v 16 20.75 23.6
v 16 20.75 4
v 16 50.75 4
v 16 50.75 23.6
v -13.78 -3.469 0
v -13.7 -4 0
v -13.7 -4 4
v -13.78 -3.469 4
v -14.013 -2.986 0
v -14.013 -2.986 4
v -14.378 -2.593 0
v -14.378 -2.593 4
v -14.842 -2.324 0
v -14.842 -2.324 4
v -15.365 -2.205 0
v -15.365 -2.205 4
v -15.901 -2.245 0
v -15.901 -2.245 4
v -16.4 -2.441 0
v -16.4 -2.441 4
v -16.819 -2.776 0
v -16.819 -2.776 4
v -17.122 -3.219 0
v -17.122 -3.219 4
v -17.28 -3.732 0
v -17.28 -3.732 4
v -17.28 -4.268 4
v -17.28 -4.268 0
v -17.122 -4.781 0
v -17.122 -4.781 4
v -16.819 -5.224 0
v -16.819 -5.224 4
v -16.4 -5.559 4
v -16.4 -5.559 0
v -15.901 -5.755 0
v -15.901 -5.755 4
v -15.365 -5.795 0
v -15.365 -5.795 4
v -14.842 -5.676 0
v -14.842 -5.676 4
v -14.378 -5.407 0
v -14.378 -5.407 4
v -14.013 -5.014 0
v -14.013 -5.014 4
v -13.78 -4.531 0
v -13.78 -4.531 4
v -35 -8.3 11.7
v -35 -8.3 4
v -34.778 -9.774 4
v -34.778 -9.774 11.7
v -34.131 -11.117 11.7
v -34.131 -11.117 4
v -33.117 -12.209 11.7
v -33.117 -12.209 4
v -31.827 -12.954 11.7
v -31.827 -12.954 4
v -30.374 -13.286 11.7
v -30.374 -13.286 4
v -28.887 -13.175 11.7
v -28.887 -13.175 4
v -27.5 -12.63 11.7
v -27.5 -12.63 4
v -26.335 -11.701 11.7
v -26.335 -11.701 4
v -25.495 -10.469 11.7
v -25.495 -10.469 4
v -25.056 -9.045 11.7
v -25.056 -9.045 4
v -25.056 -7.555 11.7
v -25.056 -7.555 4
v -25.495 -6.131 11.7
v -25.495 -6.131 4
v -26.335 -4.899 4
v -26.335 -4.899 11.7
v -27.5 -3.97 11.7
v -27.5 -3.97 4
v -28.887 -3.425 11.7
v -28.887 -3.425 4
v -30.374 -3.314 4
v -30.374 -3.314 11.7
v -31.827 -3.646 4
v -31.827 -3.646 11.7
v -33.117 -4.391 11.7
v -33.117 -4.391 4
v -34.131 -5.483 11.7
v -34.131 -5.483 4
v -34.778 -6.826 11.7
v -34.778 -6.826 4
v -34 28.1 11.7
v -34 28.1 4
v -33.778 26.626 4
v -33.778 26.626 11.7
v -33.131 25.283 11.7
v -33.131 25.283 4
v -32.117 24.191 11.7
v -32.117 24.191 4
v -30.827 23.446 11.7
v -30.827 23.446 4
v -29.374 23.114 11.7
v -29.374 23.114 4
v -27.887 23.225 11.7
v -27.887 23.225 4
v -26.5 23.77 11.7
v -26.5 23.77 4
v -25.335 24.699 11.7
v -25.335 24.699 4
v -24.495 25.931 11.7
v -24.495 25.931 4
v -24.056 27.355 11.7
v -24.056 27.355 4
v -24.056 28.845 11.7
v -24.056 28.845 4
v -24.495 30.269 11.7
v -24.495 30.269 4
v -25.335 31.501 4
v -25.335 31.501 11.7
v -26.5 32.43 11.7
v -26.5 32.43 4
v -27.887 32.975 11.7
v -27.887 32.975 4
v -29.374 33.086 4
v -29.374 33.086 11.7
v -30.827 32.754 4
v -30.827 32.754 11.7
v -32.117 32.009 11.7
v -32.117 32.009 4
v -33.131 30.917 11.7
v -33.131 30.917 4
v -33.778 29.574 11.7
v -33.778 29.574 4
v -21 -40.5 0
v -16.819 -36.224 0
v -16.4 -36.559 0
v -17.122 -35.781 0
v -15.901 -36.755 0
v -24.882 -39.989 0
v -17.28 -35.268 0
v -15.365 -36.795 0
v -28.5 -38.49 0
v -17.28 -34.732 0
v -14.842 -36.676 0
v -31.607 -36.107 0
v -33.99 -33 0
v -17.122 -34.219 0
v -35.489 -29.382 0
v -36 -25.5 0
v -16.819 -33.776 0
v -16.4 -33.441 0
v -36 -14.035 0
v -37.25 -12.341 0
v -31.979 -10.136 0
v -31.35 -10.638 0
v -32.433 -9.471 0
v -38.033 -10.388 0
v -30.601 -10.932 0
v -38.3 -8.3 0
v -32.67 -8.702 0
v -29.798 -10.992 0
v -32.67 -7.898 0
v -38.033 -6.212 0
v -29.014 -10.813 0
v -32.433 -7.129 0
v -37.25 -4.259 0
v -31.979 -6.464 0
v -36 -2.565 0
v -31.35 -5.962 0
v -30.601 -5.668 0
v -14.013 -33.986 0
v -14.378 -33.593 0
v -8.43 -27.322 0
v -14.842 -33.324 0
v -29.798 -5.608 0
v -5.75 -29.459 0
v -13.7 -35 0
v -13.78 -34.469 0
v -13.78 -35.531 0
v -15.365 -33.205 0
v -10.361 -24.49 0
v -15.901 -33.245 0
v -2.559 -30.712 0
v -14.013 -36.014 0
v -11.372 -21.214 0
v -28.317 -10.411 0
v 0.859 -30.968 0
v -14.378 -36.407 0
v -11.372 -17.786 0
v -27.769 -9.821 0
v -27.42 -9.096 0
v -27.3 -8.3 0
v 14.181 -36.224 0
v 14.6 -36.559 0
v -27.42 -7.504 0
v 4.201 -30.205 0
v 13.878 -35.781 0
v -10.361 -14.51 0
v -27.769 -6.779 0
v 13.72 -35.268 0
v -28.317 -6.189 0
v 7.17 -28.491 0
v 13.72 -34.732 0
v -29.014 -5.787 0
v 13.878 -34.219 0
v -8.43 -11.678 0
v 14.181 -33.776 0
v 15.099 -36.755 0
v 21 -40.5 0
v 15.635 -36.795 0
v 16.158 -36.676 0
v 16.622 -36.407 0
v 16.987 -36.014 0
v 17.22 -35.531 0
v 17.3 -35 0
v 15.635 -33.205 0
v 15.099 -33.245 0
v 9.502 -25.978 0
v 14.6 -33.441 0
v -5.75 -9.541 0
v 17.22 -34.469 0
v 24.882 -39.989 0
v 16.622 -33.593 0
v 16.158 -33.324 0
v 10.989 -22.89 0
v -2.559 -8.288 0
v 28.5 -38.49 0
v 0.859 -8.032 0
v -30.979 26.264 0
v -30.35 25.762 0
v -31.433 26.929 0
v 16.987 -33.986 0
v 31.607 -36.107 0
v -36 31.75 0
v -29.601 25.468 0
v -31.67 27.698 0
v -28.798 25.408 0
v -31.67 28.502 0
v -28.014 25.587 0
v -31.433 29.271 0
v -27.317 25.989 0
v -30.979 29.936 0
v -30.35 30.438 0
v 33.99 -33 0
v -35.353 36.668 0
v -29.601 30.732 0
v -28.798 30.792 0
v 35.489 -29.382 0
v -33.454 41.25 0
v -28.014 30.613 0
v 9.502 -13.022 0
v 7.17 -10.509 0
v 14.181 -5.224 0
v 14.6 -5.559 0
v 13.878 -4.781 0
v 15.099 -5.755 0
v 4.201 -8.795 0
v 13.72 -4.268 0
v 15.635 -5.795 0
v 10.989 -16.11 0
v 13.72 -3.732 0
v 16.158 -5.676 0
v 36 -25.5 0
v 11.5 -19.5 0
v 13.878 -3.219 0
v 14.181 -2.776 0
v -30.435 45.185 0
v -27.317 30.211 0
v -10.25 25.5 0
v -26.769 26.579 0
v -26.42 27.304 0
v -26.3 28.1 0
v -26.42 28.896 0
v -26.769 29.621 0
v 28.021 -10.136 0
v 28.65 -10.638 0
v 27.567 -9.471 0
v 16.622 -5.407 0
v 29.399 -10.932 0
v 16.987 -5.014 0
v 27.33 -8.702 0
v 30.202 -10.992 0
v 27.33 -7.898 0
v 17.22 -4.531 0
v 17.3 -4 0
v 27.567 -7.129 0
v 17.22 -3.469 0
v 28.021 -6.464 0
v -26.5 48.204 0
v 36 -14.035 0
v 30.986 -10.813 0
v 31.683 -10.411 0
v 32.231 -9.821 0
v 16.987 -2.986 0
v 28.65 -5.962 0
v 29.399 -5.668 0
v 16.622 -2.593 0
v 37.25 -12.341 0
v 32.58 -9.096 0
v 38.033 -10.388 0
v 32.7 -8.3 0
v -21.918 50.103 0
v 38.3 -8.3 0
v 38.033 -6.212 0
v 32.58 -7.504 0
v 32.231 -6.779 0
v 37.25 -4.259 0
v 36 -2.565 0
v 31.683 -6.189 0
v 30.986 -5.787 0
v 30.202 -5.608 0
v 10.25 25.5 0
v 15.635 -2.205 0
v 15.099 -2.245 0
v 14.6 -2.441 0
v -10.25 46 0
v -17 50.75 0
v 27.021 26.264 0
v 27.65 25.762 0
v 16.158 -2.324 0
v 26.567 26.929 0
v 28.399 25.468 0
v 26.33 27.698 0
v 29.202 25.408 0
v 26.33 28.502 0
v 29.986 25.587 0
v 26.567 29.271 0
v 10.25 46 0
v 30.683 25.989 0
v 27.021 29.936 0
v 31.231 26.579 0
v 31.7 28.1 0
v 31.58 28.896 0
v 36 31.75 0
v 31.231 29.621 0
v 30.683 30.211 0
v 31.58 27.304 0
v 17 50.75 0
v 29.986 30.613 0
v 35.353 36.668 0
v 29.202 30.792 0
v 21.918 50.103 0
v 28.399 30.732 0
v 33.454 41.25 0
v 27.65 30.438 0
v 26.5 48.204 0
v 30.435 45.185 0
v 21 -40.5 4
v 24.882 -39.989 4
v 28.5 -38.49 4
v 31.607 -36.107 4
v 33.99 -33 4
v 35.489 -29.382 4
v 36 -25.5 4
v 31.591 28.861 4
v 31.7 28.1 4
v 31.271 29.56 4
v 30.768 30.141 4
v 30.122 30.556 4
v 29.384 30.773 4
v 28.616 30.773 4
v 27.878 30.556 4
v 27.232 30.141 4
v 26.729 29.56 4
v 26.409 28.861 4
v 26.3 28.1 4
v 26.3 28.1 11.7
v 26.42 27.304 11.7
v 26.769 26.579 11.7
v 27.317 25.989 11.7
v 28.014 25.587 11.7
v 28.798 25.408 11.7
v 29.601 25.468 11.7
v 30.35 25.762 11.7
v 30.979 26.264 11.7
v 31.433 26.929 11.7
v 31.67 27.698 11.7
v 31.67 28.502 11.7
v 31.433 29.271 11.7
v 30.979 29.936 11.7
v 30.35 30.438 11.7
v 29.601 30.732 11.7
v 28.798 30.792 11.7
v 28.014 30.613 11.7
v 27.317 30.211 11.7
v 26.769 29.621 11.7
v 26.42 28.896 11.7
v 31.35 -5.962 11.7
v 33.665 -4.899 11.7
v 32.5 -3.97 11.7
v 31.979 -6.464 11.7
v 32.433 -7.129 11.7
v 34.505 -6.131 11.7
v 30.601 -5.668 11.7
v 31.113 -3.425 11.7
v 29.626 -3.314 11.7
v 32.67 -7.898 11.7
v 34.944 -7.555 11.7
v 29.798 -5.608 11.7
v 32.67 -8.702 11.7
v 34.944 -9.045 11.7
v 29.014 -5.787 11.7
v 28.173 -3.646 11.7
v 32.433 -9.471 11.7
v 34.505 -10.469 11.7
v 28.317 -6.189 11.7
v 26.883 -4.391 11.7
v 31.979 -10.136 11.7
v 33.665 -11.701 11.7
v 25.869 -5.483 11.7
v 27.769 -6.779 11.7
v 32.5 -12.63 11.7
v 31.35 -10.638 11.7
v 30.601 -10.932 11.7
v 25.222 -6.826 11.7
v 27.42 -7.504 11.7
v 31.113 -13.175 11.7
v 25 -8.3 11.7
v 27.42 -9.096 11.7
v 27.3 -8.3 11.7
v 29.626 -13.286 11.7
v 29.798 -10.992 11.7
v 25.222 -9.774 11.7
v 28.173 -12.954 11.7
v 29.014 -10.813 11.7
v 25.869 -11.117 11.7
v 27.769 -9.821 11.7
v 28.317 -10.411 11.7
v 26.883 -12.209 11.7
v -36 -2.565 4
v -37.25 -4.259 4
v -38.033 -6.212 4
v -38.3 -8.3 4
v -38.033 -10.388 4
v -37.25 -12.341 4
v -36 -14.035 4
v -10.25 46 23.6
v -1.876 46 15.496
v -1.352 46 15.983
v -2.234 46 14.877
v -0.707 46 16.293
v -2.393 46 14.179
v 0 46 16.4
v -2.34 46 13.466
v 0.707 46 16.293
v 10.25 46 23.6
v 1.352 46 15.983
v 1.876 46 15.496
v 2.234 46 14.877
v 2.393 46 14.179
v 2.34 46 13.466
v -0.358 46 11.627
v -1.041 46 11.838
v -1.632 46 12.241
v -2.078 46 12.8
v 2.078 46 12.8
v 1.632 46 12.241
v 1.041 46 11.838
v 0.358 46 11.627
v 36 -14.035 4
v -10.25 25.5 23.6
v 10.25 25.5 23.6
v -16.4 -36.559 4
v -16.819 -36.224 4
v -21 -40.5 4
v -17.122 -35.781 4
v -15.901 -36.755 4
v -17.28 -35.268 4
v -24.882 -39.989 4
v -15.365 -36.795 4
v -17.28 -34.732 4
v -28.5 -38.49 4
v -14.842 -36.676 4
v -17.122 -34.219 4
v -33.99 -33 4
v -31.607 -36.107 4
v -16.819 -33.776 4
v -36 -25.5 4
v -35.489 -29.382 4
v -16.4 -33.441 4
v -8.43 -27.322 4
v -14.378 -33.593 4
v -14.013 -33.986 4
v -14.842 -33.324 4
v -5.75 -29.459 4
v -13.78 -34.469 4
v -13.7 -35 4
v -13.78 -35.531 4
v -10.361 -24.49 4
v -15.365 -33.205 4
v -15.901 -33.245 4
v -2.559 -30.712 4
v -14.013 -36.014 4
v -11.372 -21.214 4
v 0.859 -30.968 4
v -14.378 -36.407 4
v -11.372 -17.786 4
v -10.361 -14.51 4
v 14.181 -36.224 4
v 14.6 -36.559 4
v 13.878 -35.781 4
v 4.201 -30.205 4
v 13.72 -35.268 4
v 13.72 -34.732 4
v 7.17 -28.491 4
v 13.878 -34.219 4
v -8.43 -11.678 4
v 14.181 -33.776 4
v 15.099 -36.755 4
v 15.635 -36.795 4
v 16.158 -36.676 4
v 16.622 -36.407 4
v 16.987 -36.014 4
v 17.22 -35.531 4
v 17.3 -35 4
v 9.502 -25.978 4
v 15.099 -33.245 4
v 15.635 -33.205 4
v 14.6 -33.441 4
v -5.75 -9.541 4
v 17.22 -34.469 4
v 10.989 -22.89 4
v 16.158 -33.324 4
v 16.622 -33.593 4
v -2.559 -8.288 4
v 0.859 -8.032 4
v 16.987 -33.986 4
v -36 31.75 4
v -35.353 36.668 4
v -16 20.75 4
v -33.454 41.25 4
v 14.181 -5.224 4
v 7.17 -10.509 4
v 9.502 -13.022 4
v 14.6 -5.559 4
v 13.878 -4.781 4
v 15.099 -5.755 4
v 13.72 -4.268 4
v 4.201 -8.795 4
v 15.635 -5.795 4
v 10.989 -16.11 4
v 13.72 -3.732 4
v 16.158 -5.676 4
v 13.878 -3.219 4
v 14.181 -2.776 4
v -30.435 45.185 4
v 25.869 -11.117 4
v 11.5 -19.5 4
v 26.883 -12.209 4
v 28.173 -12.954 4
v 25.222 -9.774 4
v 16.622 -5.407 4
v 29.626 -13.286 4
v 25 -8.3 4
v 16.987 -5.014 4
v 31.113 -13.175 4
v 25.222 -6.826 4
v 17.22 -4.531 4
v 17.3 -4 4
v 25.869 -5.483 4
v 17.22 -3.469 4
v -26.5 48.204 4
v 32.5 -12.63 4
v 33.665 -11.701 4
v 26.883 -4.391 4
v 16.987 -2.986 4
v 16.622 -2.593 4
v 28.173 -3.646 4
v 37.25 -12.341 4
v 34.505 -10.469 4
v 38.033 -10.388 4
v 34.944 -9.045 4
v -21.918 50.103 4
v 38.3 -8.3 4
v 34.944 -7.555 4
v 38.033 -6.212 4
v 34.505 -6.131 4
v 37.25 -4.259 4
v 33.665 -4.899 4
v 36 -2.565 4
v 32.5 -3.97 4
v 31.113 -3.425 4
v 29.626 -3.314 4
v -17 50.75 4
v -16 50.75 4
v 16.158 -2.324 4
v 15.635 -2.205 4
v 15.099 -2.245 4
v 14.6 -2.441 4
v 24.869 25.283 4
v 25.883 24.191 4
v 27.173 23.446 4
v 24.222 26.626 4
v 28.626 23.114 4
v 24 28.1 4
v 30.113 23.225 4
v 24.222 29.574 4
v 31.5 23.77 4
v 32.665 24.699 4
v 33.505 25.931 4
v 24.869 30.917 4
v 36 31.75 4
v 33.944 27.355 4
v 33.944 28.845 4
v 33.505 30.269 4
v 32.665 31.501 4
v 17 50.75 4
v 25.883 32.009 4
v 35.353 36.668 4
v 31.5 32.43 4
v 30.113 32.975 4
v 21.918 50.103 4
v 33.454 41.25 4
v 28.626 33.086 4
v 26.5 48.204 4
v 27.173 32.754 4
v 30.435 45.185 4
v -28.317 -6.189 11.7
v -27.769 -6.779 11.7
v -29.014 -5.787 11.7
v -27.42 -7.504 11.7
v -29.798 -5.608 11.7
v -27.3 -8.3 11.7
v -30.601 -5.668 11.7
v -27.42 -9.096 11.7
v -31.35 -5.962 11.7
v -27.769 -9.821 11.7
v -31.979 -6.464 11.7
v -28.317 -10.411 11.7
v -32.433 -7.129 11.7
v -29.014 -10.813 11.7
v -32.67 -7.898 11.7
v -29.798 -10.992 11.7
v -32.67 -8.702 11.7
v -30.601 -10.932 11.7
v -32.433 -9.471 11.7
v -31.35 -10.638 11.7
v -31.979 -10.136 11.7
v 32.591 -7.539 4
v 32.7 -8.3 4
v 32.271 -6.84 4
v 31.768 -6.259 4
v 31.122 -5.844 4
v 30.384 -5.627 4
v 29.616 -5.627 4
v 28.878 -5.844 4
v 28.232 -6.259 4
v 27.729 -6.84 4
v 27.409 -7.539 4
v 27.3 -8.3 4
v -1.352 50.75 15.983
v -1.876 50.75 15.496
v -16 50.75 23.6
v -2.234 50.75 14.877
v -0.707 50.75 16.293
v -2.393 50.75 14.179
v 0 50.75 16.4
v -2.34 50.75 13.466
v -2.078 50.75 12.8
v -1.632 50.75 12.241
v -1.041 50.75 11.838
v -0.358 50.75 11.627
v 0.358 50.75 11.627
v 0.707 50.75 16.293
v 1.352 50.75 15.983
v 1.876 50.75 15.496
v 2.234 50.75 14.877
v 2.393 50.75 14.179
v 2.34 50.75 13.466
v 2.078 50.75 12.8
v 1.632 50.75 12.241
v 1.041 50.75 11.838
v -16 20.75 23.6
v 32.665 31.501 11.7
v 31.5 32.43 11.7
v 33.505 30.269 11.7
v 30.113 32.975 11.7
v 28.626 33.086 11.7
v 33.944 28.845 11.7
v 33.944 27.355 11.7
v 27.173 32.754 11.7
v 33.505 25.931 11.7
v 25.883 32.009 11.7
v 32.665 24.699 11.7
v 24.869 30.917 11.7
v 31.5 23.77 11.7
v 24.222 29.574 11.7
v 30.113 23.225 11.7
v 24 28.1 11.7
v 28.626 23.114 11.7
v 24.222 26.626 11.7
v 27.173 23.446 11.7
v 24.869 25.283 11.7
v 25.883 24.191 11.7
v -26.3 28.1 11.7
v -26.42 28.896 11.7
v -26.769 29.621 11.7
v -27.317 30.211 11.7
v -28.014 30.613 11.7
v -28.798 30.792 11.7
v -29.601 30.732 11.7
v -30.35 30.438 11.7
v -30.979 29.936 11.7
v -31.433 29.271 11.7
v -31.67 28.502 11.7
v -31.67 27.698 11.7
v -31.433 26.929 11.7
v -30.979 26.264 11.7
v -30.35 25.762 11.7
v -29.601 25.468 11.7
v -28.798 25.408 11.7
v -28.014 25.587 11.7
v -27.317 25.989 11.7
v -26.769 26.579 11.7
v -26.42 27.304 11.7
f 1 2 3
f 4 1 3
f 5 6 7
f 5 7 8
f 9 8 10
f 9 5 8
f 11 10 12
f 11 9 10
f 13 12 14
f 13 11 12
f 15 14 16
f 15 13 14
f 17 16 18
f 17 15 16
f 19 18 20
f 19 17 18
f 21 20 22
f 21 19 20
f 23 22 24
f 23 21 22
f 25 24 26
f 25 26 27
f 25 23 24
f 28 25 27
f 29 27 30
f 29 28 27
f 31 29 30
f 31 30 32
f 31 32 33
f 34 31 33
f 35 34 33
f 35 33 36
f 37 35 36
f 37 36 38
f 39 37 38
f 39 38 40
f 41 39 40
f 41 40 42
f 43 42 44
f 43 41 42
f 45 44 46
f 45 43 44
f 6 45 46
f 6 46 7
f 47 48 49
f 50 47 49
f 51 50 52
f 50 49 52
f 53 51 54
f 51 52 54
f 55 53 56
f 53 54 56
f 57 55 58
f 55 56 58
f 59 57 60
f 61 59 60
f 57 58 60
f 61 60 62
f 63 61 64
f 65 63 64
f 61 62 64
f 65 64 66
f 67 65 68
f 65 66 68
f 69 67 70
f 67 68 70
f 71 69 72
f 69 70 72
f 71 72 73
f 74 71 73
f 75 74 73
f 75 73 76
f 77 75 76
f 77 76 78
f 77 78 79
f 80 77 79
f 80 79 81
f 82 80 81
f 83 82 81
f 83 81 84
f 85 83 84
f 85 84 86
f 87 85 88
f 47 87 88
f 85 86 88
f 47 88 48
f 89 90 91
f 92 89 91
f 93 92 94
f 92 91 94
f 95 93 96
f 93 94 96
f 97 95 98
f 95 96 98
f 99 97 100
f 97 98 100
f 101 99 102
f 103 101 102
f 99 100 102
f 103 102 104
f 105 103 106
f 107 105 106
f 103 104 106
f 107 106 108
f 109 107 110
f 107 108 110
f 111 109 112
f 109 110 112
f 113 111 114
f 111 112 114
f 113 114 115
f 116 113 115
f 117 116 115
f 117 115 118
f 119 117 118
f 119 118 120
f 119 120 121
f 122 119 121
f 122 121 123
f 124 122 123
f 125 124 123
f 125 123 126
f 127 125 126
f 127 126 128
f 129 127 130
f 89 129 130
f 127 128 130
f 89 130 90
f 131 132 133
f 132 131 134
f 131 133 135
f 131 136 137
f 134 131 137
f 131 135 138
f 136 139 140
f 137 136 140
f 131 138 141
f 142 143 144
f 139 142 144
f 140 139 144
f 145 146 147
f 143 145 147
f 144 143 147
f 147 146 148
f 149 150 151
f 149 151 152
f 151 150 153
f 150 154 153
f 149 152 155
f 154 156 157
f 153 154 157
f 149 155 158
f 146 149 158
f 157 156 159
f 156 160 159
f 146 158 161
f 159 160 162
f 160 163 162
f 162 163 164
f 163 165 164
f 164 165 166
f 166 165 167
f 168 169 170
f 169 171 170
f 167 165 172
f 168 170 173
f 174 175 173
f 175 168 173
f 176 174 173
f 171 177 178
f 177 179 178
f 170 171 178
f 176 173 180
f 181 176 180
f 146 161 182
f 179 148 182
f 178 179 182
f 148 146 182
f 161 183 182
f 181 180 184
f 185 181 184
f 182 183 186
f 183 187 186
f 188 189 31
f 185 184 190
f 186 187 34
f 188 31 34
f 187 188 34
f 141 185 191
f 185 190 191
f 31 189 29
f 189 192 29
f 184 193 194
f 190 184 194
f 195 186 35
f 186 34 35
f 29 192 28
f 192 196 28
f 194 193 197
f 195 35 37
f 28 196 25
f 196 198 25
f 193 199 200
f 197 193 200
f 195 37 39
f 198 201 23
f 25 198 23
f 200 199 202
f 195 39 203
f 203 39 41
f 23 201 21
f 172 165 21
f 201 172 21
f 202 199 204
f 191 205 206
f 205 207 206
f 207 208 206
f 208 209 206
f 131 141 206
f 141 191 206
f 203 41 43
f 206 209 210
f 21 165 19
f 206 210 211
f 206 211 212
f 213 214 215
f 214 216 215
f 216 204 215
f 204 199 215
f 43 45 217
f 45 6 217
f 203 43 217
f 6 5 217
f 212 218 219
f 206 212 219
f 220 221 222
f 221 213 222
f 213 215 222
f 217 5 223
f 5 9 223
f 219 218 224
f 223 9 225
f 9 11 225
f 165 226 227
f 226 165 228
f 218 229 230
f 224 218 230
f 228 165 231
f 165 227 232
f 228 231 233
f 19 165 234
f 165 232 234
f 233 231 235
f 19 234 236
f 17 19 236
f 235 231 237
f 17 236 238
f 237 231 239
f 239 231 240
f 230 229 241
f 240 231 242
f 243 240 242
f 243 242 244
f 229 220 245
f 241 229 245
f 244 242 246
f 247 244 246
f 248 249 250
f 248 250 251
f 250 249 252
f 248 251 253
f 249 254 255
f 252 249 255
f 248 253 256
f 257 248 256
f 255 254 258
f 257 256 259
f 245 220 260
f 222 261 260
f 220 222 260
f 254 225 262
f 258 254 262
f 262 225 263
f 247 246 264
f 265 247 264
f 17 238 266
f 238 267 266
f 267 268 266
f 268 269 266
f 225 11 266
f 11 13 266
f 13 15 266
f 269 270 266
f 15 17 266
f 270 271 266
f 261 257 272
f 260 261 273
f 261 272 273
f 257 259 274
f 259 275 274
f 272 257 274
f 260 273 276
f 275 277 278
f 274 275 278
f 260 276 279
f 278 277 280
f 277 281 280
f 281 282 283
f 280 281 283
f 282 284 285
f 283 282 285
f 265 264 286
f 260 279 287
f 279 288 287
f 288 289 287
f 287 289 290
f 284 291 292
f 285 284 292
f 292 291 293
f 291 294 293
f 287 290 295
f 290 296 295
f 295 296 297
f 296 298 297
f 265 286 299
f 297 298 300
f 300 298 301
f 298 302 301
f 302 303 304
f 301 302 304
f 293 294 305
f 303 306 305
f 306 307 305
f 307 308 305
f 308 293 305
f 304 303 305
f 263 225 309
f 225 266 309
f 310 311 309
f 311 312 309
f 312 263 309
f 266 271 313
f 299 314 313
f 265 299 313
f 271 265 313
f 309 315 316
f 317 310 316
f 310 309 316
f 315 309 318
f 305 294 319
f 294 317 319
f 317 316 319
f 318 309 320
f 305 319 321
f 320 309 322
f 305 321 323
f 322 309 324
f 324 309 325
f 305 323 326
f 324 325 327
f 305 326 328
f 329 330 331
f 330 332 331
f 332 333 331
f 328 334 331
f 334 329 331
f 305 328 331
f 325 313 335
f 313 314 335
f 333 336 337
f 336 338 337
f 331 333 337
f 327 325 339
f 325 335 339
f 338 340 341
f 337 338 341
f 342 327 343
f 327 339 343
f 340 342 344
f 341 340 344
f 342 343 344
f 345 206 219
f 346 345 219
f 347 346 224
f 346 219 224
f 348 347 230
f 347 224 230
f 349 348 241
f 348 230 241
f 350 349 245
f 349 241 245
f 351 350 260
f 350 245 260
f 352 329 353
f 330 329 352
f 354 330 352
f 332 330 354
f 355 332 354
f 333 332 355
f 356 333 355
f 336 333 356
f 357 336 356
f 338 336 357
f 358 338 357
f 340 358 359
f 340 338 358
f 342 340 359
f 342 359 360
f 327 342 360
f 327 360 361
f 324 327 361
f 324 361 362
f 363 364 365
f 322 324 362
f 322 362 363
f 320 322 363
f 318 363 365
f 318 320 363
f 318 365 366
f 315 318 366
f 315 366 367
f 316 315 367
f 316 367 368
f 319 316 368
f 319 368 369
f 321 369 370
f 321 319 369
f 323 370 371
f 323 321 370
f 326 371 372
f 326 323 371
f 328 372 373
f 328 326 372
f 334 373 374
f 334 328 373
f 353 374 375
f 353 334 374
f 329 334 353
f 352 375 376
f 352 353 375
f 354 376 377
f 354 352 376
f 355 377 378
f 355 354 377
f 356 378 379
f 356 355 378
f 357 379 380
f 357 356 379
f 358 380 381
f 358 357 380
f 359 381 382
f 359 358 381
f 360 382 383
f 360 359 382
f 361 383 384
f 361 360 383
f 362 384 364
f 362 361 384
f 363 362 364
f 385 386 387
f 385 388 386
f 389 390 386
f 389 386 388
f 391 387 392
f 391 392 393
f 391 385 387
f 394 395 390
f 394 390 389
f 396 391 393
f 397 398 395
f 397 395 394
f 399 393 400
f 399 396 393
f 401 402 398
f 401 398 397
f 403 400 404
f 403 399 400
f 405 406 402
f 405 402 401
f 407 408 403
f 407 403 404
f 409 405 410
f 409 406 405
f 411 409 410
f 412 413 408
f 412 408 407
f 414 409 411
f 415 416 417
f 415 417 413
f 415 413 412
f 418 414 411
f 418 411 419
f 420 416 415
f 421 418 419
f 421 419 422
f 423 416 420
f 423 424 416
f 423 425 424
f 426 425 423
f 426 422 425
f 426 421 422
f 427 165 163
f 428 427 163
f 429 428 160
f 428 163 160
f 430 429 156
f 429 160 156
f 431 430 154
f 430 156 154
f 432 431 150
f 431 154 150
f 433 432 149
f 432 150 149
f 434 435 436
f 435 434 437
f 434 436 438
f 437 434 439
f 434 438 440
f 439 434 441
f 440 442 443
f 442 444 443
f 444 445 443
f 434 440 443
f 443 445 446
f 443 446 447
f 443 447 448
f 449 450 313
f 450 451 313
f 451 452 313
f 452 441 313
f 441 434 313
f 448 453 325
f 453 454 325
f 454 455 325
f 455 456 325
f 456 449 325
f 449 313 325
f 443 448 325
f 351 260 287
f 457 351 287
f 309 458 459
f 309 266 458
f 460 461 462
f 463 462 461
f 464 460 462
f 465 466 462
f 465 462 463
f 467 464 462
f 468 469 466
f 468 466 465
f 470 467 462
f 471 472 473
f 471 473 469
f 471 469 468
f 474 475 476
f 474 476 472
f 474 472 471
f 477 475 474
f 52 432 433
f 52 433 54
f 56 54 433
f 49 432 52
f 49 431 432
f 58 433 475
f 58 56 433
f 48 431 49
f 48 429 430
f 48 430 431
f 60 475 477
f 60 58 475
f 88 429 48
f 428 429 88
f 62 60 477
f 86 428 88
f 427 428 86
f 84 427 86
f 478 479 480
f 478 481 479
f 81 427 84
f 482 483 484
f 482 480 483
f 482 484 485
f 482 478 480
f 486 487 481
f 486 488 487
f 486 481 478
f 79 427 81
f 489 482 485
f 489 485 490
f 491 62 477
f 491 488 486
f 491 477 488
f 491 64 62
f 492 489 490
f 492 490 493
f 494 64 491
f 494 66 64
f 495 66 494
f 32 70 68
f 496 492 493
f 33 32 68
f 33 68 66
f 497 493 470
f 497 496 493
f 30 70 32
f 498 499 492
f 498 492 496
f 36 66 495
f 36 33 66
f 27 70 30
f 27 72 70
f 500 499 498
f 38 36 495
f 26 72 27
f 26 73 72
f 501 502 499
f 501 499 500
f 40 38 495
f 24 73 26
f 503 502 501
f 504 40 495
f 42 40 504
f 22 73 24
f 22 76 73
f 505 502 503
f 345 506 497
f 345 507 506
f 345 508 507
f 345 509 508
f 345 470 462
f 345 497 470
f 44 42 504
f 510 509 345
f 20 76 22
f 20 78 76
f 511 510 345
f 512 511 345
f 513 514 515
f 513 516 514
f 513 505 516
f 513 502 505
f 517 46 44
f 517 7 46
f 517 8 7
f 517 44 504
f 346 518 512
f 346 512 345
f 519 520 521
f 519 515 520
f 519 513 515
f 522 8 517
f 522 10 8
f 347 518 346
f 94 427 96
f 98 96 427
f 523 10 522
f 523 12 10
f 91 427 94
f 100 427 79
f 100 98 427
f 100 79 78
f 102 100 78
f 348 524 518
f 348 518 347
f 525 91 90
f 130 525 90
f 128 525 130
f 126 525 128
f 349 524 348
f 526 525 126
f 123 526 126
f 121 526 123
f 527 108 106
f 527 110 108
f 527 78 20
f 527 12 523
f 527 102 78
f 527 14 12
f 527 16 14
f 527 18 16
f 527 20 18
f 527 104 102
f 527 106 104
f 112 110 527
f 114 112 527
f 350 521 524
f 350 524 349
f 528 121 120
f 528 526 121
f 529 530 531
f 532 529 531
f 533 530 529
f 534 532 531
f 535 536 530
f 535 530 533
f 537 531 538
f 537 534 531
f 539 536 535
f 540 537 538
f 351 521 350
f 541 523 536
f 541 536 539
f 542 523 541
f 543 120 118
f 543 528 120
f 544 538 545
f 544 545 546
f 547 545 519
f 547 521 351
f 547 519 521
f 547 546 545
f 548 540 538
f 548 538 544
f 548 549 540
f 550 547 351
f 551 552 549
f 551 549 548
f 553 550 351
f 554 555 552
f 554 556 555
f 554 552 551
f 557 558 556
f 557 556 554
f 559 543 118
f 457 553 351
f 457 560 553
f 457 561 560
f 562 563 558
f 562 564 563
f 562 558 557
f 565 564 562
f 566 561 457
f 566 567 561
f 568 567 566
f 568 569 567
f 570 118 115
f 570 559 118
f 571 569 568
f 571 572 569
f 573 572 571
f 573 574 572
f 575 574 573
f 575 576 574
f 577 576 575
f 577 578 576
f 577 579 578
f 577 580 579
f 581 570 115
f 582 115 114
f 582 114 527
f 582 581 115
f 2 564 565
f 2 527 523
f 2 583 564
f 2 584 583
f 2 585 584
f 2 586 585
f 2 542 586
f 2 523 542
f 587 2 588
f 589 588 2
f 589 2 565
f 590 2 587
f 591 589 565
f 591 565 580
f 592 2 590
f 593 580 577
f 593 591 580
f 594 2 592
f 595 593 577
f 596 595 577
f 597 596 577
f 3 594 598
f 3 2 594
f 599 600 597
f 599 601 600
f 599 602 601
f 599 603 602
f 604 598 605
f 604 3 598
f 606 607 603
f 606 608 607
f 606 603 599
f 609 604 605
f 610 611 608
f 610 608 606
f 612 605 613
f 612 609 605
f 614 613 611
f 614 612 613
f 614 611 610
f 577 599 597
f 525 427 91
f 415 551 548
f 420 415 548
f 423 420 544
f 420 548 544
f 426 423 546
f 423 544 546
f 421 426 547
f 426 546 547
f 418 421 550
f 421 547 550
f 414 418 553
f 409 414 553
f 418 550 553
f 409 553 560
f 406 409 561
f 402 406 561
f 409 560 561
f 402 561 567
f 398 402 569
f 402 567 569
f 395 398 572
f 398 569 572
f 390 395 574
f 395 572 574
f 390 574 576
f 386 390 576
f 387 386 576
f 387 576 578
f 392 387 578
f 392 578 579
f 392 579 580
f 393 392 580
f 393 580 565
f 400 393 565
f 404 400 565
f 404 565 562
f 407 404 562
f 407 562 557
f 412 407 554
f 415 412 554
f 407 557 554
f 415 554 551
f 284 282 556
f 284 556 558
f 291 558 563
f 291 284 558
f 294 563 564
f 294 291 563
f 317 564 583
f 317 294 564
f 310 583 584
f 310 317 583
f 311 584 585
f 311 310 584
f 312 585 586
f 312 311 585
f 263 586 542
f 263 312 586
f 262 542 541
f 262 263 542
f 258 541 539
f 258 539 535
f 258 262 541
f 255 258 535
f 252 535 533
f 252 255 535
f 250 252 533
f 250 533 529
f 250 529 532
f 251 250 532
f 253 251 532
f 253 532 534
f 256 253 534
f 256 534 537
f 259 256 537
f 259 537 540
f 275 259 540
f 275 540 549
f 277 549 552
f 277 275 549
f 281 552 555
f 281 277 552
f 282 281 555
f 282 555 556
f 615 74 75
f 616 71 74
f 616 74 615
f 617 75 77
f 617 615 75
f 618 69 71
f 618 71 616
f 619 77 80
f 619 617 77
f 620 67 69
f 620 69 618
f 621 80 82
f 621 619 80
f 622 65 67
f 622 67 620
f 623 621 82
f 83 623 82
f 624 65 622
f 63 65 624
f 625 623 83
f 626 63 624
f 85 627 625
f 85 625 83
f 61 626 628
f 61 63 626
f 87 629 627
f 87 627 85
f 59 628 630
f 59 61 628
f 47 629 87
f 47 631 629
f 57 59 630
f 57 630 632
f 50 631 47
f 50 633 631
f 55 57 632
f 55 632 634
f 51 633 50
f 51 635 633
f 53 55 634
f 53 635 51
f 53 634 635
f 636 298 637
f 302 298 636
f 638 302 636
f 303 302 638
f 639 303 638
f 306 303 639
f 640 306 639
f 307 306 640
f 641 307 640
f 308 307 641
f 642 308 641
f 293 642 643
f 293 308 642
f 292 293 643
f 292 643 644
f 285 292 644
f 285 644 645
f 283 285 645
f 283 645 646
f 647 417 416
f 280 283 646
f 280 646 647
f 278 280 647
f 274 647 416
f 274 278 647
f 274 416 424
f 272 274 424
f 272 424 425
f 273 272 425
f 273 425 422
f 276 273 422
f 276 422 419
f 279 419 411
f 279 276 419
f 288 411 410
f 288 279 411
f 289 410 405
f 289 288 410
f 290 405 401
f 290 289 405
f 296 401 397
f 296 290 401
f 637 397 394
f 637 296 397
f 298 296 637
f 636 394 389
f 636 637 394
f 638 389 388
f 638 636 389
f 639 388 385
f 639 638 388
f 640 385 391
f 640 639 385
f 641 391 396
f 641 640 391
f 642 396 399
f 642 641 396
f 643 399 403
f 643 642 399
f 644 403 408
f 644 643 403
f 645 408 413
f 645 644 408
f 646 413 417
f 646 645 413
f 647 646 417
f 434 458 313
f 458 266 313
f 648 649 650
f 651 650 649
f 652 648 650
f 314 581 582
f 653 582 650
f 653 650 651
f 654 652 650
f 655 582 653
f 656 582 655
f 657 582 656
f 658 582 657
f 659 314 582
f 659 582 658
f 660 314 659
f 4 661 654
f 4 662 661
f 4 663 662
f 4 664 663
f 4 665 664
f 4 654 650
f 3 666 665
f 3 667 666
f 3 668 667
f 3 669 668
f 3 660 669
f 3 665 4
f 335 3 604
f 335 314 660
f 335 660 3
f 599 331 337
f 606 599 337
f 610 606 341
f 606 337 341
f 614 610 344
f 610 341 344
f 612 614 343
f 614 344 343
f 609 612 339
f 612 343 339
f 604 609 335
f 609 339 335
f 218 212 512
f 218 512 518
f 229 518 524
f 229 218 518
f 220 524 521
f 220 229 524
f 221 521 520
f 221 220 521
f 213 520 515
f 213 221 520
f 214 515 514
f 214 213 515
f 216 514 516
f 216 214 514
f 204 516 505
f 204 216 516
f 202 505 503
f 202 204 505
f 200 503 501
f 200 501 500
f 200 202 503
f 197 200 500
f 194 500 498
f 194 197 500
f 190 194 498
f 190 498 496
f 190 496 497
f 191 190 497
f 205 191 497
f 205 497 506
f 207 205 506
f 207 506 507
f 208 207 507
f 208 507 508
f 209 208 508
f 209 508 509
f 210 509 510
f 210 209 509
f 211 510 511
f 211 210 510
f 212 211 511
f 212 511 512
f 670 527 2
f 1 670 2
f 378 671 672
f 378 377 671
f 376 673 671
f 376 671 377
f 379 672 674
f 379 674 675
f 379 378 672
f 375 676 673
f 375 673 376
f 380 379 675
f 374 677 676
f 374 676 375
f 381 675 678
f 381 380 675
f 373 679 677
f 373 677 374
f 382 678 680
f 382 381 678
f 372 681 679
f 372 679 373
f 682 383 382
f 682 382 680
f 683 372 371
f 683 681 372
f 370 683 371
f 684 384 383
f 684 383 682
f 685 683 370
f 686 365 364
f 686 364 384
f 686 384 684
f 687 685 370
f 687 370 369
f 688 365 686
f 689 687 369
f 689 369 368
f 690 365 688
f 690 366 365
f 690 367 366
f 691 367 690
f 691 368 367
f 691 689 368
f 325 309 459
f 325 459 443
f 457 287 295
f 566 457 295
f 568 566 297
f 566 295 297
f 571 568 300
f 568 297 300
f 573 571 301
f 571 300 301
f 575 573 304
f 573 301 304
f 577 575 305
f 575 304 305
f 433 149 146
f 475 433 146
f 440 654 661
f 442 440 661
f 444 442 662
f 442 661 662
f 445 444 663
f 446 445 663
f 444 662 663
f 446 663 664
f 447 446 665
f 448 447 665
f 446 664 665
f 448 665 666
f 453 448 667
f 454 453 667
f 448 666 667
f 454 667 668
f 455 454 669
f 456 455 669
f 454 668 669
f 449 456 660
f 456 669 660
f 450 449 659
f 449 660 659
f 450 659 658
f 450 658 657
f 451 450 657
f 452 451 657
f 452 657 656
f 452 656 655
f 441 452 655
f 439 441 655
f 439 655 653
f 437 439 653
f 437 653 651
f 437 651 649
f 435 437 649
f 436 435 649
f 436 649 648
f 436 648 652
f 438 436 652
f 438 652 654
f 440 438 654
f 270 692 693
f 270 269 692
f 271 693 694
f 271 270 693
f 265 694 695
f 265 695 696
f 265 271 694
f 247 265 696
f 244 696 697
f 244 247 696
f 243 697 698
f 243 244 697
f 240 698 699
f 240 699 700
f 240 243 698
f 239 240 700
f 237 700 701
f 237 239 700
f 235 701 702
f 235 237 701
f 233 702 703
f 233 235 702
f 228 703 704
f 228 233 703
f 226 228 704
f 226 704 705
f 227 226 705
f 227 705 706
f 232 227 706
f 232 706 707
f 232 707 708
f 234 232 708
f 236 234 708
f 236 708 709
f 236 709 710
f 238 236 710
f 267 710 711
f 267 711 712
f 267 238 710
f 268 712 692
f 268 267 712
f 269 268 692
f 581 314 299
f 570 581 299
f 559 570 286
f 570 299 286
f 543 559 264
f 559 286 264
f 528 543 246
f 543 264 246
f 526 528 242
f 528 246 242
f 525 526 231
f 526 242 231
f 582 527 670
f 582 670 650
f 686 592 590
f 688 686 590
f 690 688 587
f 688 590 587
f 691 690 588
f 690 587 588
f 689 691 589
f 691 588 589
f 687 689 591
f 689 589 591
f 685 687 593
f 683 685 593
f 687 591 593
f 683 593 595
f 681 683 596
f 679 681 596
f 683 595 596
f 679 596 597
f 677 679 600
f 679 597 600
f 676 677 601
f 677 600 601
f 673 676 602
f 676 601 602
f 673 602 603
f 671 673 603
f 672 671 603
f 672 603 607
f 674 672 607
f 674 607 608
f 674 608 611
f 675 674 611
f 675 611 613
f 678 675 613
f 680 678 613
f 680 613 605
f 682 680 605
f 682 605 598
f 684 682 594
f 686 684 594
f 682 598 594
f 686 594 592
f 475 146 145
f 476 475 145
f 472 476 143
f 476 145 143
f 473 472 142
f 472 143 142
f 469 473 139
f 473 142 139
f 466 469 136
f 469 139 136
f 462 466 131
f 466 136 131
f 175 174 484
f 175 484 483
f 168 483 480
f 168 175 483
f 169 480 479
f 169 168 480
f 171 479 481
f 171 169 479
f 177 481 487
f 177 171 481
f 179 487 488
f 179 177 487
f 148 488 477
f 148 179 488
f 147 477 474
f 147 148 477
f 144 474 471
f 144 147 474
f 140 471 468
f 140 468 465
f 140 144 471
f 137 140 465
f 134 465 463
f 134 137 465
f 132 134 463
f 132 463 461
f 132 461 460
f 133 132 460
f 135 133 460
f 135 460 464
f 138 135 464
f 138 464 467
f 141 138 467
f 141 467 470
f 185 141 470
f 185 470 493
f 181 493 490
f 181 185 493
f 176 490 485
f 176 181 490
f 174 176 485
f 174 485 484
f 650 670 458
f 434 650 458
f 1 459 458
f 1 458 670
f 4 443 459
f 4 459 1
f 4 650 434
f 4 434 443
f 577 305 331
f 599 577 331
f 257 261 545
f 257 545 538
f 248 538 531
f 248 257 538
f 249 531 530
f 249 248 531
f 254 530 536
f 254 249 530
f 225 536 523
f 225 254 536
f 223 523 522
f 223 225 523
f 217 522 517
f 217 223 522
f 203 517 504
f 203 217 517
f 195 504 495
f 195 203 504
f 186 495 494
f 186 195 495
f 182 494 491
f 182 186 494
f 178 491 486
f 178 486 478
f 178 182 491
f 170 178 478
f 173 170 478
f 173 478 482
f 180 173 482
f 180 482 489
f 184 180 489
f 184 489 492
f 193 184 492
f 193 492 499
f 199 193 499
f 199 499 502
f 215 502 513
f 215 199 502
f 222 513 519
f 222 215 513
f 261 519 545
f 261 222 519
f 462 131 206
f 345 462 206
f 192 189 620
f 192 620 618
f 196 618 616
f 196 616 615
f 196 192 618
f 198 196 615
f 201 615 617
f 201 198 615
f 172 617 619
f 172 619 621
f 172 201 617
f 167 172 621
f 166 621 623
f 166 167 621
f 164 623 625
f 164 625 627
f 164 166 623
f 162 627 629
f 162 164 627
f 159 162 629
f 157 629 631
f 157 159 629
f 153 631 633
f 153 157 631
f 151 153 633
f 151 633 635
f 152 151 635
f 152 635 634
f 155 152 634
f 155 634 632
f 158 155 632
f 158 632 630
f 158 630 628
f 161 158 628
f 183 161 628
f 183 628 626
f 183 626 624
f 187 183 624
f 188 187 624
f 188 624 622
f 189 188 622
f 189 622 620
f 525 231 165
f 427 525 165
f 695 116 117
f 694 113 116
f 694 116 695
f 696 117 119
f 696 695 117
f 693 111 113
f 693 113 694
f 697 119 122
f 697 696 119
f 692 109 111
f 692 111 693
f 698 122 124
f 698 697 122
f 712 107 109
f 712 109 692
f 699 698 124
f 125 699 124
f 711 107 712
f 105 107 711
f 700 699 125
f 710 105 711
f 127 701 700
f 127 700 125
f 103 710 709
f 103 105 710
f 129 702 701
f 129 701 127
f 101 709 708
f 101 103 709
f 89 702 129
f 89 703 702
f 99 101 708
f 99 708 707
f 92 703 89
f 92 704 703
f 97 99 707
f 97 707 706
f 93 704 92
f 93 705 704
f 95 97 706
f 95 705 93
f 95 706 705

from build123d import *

# Parameters (mm, degrees)
SKETCH_1_R          = 1.8
SKETCH_1_R_2        = 11.5
SKETCH_1_R_3        = 2.7
SKETCH_1_W          = 20.5
SKETCH_1_H          = 20.5
EXTRUDE_1_DEPTH     = 4
EXTRUDE_START       = 4
SKETCH_1_4_W        = 32
SKETCH_1_4_H        = 30
SKETCH_1_4_W_2      = 20.5
SKETCH_1_4_H_2      = 20.5
SKETCH_1_4_R        = 1.6
EXTRUDE_3_DEPTH     = 19.6
CUT_EXTRUDE_4_REACH = 103.737
SKETCH_8_R          = 2.4
SKETCH_9_R          = 5
SKETCH_9_R_2        = 2.7
EXTRUDE_4_DEPTH     = 7.7


with BuildPart() as part:
    # 草图1 → 凸台-拉伸1 (new body)
    with BuildSketch(Plane.XY):
        with BuildLine():
            ThreePointArc((-36, -25.5), (-31.606601718, -36.106601718), (-21, -40.5))
            Line((-21, -40.5), (21, -40.5))
            ThreePointArc((21, -40.5), (31.606601718, -36.106601718), (36, -25.5))
            Line((36, -25.5), (36, -14.034980384))
            ThreePointArc((36, -14.034980384), (38.3, -8.3), (36, -2.565019616))
            Line((36, -2.565019616), (36, 31.75))
            ThreePointArc((36, 31.75), (30.435028843, 45.185028843), (17, 50.75))
            Line((17, 50.75), (-17, 50.75))
            ThreePointArc((-17, 50.75), (-30.435028843, 45.185028843), (-36, 31.75))
            Line((-36, 31.75), (-36, -2.565019616))
            ThreePointArc((-36, -2.565019616), (-38.3, -8.3), (-36, -14.034980384))
            Line((-36, -14.034980384), (-36, -25.5))
        make_face()
        with Locations((15.5, -35)):
            Circle(SKETCH_1_R, mode=Mode.SUBTRACT)
        with Locations((0, -19.5)):
            Circle(SKETCH_1_R_2, mode=Mode.SUBTRACT)
        with Locations((15.5, -4)):
            Circle(SKETCH_1_R, mode=Mode.SUBTRACT)
        with Locations((-15.5, -35)):
            Circle(SKETCH_1_R, mode=Mode.SUBTRACT)
        with Locations((-15.5, -4)):
            Circle(SKETCH_1_R, mode=Mode.SUBTRACT)
        with Locations((-30, -8.3)):
            Circle(SKETCH_1_R_3, mode=Mode.SUBTRACT)
        with Locations((30, -8.3)):
            Circle(SKETCH_1_R_3, mode=Mode.SUBTRACT)
        with Locations((-29, 28.1)):
            Circle(SKETCH_1_R_3, mode=Mode.SUBTRACT)
        with Locations((29, 28.1)):
            Circle(SKETCH_1_R_3, mode=Mode.SUBTRACT)
        with Locations((0, 35.75)):
            Rectangle(SKETCH_1_W, SKETCH_1_H, mode=Mode.SUBTRACT)
    extrude(amount=EXTRUDE_1_DEPTH)

    # 草图1<4> → 凸台-拉伸3 (add)
    # profile 1 of 3: a face of its own
    with BuildSketch(Plane.XY.offset(EXTRUDE_START)):
        with Locations((0, 35.75)):
            Rectangle(SKETCH_1_4_W, SKETCH_1_4_H)
        with Locations((0, 35.75)):
            Rectangle(SKETCH_1_4_W_2, SKETCH_1_4_H_2, mode=Mode.SUBTRACT)
    # profile 2 of 3: a face of its own
    with BuildSketch(Plane.XY.offset(EXTRUDE_START)):
        with Locations((-13.2, 35.75)):
            Circle(SKETCH_1_4_R)
    # profile 3 of 3: a face of its own
    with BuildSketch(Plane.XY.offset(EXTRUDE_START)):
        with Locations((13.2, 35.75)):
            Circle(SKETCH_1_4_R)
    extrude(amount=EXTRUDE_3_DEPTH)

    # 草图8 → 切除-拉伸4 (cut, up to next)
    with BuildSketch(Plane(origin=(0, 50.75, 0), x_dir=(1, 0, 0), z_dir=(0, 1, 0)), mode=Mode.PRIVATE) as cut_extrude_4_sk1:
        with Locations(Location((0, -14, 0), (0, 0, 270))):
            Circle(SKETCH_8_R)
    cut_extrude_4_tool1 = extrude(cut_extrude_4_sk1.sketch, amount=-CUT_EXTRUDE_4_REACH, mode=Mode.PRIVATE) & part.part
    add(cut_extrude_4_tool1.solids().sort_by_distance((0, 50.75, 14))[0], mode=Mode.SUBTRACT)

    # 草图9 → 凸台-拉伸4 (add)
    # profile 1 of 4: a face of its own
    with BuildSketch(Plane.XY.offset(4)):
        with Locations(Location((-29, 28.1, 0), (0, 0, 180))):
            Circle(SKETCH_9_R)
        with Locations((-29, 28.1)):
            Circle(SKETCH_9_R_2, mode=Mode.SUBTRACT)
    # profile 2 of 4: a face of its own
    with BuildSketch(Plane.XY.offset(4)):
        with Locations(Location((-30, -8.3, 0), (0, 0, 180))):
            Circle(SKETCH_9_R)
        with Locations((-30, -8.3)):
            Circle(SKETCH_9_R_2, mode=Mode.SUBTRACT)
    # profile 3 of 4: a face of its own
    with BuildSketch(Plane.XY.offset(4)):
        with Locations(Location((30, -8.3, 0), (0, 0, 180))):
            Circle(SKETCH_9_R)
        with Locations(Location((30, -8.3, 0), (0, 0, 180))):
            Circle(SKETCH_9_R_2, mode=Mode.SUBTRACT)
    # profile 4 of 4: a face of its own
    with BuildSketch(Plane.XY.offset(4)):
        with Locations(Location((29, 28.1, 0), (0, 0, 180))):
            Circle(SKETCH_9_R)
        with Locations(Location((29, 28.1, 0), (0, 0, 180))):
            Circle(SKETCH_9_R_2, mode=Mode.SUBTRACT)
    extrude(amount=EXTRUDE_4_DEPTH)


solid = part.part
